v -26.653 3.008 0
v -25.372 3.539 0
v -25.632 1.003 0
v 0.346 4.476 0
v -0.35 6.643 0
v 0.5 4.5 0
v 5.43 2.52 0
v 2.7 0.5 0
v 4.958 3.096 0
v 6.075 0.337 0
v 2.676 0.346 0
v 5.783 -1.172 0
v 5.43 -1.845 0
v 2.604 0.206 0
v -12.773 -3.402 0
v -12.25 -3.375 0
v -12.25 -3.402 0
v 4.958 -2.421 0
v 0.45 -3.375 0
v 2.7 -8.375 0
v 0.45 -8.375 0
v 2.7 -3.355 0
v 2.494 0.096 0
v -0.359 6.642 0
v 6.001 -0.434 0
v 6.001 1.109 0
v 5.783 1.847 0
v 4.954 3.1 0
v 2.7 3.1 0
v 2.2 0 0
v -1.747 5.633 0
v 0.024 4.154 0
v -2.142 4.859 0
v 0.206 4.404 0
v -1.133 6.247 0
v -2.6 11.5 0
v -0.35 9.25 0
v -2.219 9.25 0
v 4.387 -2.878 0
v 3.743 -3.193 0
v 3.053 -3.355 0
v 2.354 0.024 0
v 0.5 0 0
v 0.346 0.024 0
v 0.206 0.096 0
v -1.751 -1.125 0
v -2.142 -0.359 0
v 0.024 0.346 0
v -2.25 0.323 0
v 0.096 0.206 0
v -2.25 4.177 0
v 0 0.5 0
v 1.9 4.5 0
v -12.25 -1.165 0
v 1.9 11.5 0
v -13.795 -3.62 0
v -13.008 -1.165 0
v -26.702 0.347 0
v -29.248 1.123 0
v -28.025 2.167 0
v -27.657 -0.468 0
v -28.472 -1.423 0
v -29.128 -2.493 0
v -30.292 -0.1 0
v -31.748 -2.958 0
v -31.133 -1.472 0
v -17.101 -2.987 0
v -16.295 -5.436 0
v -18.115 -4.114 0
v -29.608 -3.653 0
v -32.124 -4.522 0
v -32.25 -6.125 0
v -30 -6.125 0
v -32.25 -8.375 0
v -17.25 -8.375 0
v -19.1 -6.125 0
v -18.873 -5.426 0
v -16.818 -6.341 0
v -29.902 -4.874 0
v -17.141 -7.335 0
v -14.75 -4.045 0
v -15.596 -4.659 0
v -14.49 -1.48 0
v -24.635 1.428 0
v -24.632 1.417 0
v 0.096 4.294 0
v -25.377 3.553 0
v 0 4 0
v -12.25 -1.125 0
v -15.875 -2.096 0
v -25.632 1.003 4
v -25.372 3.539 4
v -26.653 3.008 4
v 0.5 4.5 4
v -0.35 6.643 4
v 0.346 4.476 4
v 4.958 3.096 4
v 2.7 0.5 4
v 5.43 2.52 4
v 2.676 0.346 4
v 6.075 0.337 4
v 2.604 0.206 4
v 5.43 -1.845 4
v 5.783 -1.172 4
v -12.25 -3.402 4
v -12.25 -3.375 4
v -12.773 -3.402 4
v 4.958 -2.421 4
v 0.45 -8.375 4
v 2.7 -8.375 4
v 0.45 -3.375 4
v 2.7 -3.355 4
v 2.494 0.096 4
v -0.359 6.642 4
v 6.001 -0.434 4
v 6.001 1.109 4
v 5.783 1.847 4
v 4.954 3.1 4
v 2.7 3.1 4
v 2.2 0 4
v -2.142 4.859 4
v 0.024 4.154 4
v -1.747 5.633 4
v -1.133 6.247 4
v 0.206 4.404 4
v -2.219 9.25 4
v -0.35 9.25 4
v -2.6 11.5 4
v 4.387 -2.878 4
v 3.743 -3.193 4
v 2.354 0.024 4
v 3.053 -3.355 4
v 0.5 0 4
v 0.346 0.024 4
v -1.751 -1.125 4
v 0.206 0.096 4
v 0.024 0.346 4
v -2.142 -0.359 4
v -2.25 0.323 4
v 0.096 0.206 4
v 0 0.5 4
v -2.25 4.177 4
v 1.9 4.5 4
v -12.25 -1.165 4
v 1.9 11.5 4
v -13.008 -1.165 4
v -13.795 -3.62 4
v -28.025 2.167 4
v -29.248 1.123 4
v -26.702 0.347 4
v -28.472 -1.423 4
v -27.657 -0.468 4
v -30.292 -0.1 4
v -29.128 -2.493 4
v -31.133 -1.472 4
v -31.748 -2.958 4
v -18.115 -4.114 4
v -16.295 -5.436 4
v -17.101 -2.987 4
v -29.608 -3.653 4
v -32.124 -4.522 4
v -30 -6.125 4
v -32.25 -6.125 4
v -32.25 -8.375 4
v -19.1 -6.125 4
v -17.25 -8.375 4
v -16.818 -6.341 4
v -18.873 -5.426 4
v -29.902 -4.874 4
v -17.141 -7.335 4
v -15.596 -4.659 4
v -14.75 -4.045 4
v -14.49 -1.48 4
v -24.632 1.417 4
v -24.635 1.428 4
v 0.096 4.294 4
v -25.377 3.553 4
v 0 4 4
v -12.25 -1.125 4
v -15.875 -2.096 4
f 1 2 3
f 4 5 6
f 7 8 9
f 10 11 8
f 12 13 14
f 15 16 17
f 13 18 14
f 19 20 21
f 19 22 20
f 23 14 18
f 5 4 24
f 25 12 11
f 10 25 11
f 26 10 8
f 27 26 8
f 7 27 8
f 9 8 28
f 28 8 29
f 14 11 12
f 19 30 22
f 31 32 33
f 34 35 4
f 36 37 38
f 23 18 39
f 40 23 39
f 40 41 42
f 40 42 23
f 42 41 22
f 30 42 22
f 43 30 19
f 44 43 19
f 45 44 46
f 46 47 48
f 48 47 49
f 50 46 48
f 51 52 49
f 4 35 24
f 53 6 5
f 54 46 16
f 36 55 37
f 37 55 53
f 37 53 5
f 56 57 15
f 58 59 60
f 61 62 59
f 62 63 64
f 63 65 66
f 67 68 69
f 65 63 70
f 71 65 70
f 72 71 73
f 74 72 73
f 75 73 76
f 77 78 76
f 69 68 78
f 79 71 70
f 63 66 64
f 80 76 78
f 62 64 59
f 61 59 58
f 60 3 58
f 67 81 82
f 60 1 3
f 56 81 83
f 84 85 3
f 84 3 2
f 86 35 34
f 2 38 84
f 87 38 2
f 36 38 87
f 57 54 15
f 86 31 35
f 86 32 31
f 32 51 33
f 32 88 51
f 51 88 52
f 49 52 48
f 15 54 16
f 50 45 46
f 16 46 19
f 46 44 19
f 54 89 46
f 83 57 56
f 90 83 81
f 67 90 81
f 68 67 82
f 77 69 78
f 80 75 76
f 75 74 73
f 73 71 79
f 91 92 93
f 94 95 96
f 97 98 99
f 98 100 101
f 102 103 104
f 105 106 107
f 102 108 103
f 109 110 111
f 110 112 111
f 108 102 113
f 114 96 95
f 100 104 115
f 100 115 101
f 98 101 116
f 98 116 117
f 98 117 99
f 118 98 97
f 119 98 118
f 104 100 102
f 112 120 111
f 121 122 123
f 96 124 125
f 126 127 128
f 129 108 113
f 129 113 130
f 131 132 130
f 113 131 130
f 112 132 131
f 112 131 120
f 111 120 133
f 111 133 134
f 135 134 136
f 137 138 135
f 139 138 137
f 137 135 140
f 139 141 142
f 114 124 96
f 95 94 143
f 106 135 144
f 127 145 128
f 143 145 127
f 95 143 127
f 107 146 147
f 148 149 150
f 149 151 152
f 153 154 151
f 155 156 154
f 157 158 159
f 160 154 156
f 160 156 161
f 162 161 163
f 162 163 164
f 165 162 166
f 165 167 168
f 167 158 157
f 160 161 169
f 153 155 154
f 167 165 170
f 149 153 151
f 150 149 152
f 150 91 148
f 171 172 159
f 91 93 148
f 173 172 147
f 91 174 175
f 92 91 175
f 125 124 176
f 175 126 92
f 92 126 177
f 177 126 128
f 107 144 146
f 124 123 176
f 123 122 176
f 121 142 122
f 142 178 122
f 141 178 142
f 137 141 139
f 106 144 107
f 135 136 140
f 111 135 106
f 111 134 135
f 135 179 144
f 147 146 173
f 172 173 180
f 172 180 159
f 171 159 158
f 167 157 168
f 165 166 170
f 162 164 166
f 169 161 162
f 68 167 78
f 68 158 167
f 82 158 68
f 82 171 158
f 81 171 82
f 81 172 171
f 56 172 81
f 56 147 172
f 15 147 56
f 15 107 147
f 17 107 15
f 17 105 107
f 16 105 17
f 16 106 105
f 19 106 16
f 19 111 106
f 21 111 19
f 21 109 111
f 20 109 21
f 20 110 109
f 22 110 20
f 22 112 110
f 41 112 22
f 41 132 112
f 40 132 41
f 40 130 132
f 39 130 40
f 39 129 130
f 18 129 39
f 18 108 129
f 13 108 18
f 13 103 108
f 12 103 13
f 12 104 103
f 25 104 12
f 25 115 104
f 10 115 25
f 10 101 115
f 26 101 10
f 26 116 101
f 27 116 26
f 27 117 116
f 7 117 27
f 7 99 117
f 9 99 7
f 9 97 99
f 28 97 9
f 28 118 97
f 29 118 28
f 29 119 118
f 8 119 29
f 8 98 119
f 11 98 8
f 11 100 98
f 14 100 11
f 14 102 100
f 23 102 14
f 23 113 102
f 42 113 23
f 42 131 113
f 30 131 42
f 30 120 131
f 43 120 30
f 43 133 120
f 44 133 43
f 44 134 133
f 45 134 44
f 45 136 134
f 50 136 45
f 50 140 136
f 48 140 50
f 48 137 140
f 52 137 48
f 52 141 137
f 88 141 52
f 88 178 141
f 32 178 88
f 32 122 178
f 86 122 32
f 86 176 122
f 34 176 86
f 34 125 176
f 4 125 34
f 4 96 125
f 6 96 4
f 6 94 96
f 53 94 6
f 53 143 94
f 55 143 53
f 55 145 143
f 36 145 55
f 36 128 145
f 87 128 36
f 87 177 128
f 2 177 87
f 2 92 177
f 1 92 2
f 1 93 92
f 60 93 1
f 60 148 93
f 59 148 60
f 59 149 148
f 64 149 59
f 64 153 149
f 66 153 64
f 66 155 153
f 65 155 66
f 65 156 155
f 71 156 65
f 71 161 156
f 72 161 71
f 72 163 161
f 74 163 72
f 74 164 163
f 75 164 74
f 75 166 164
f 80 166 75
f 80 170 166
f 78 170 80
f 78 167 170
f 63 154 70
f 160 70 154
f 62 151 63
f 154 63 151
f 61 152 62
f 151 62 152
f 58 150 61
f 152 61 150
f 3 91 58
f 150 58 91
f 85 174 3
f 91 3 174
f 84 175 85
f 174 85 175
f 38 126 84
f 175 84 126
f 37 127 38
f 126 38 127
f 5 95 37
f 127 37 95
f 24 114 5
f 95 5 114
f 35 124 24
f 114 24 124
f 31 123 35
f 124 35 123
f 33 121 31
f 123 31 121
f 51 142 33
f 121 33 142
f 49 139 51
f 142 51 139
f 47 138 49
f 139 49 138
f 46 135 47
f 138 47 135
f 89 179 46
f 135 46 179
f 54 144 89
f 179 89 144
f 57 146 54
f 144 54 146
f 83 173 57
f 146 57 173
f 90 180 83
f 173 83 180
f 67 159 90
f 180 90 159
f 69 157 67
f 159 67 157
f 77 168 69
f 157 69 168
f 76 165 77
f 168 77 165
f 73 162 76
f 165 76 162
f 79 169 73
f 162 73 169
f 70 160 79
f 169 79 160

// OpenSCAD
// pot_holder.scad
// By Gregg Christopher, 2015. 
// This file is public domain. Use at your own risk.


/* [Canister Bottom Edge Dimensions] */
// Height of the rolled metal portion (Rolled metal bottom of canister) Defaults are for a typical large 230g-ish canister.
edge_height = 4.5; // [0.5:0.1:15.0]
// Width (thickness) of the rolled metal portion
edge_width = 2.7; // [0.5:0.1:10.0]
// Radius to bevel the inside of the clip portion of the canister foot. Probably just cosmetic. 
edge_bevel_radius = 0.5; // [0.01:0.05:2.0]
// Thickness of the thinner metal portion above the rolled edge. Decrease to enlarge the portion of the foot pressing against the canister, if the foot tends to tilt up.
metal_thickness = .8; // [0.1:0.05:3.0]

/* [Holder Foot Dimensions] */
// Option to include a small support directly below the canister; might make it harder to break when set on a flat surface with a heavy load.
include_support_peg = "Include_Support_Peg"; // [No_Support_Peg, Include_Support_Peg]
// Width of the entire support. (Viewed from above as it sticks out from the canister.)
foot_width = 4; // [1.0:0.1:10.0]
// Thickness of the support structure.
foot_thickness = 2.25; // [0.5:0.1:10.0]
// Length of the bottom of the support leg, before it curves down to the ground.
foot_inner_length = 10; // [3.0:0.1:40.0]
// Height of the support leg, nominally how high it will hold the canister up. (Since these are plastic, a large value here is probably unwise.)
foot_lower_height = 5; // [0.1:0.1:20.0]
// Length of the portion of the leg that makes contact with the ground.
foot_base_length = 15; // [3.0:0.1:40.0]
// Height of the vertical section that makes contact with the side of the canister. 
cannister_contact_segment_height = 7; // [2.0:0.1:20.0]
// Height of the flange that grabs the inside bottom of the canister.
inner_flange_height = 3.1; // [0.5:0.1:10.0]
// Radius of the rounded portion on the outside of the upper leg of the support.
outer_leg_bevel_radius = 8; // [1.0:0.1:20.0]

/* [Hidden] */
// Calculate the angle at which the tangent line of the outer foot circle hits the rectangular top upper portion of he leg.

// Distance between the origin of the circle and the top corner of the leg

target_x_distance = (edge_width - 2*foot_thickness - metal_thickness) - (-foot_base_length - foot_inner_length - foot_lower_height + outer_leg_bevel_radius);
target_y_distance = (edge_height + cannister_contact_segment_height) - (-foot_lower_height - foot_thickness*0.5);
distance = sqrt(target_x_distance*target_x_distance + target_y_distance*target_y_distance);

// Radius of the outer foot circle portion
radius = outer_leg_bevel_radius + foot_thickness;

// Angle between the center point and the target point
otherangle = atan(target_y_distance/target_x_distance);

// Angle at which the line tangent to the circle intersects the target point
tangent_angle = acos(radius/distance) + otherangle - 90;

// Calculate the length of the upper leg segment, given all the above measurements.
tangent_point_x = -radius * sin(tangent_angle); 
tangent_point_y = radius * cos(tangent_angle); 

top_segment_x_distance = target_x_distance - tangent_point_x;
top_segment_y_distance = target_y_distance - tangent_point_y;

top_segment_length = sqrt(top_segment_x_distance * top_segment_x_distance + top_segment_y_distance * top_segment_y_distance);

module edge_outline() {
  translate([edge_bevel_radius, edge_bevel_radius])
  minkowski() {
    square([edge_width - 2*edge_bevel_radius, edge_height - 2*edge_bevel_radius]);
    circle(r = edge_bevel_radius, $fn = 20);
  }
}

linear_extrude(height = foot_width) {
  union() {
    // The main outline of the cannister clip
    difference() {
      union() {
        offset(delta = foot_thickness) edge_outline();
        // Extra material to reinforce the pot holder clip. (The weakest part of the structure.)
        translate([edge_width, foot_thickness*1.5*.1])
        scale([1, 1.1])
        intersection() {
          circle(r = foot_thickness*1.5, $fn = 30);
          //translate([0, -foot_thickness*1.5]) square([foot_thickness*1.5, foot_thickness*1.5]);
          translate([0, -foot_thickness*1.5]) 
          square([foot_thickness*1.5, foot_thickness*3.0]);
        }
      }

      edge_outline();
      //translate([edge_width - metal_thickness, edge_height - edge_bevel_radius])
      //square([metal_thickness, foot_thickness + edge_bevel_radius]);
      //translate([edge_width - metal_thickness, foot_thickness*1.0])
      translate([edge_width - metal_thickness, inner_flange_height])
      square([metal_thickness + foot_thickness*2, foot_thickness + edge_bevel_radius + edge_height - edge_bevel_radius - foot_thickness*1.0 + inner_flange_height]);
    }
    
    
    /* 
    // Full length thicker flange
    //translate([edge_width, 0])
    // square([foot_thickness*1.5, edge_height/2 - foot_thickness/2]); 

    translate([edge_width, edge_height - foot_thickness/2])
    %intersection() {
      circle(r = foot_thickness*1.5, $fn = 30);
      square([foot_thickness*1.5, foot_thickness*1.5]);
    }
    */
    
    // Inner segment holding the side of the cannister
    translate([edge_width - foot_thickness - metal_thickness, edge_height])
    square([foot_thickness, cannister_contact_segment_height]);

    translate([edge_width - 2*foot_thickness - metal_thickness, edge_height + cannister_contact_segment_height - foot_thickness])
    square([foot_thickness*2, foot_thickness]);
    
    // Optional support peg directly below the canister
    if(include_support_peg == "Include_Support_Peg") {
      translate([edge_width - foot_thickness, -foot_lower_height - foot_thickness*1.5])
      square([foot_thickness, foot_lower_height]);
    }

    // Main segment of bottom leg extension
    translate([-foot_inner_length - foot_thickness, -foot_thickness*1.5])
    square([foot_inner_length + foot_thickness + edge_width, foot_thickness]);
    
    // The curved portion of the lower leg extension
    translate([-foot_inner_length - foot_thickness, -foot_lower_height - foot_thickness*1.5])
    intersection() {
      difference() {
        circle(r = foot_lower_height + foot_thickness, $fn = 30);
        circle(r = foot_lower_height, $fn = 30);
      }
      translate([-foot_lower_height - foot_thickness, 0])
      square([foot_lower_height + foot_thickness, foot_lower_height + foot_thickness]);
    }
    
    // The bottom segment that rests on the ground
    translate([-foot_base_length - foot_inner_length - foot_thickness - foot_lower_height, -foot_lower_height - foot_thickness*1.5])
    square([foot_base_length, foot_thickness]);
    
    // The annoyingly shaped top leg extension
    
    translate([-foot_base_length - foot_inner_length - foot_lower_height + outer_leg_bevel_radius, -foot_lower_height - foot_thickness*0.5])
    intersection() {
      difference() {
        circle(r = outer_leg_bevel_radius + foot_thickness, $fn = 40);
        circle(r = outer_leg_bevel_radius, $fn = 40);
      }
      rotate([0, 0, 90]) square([outer_leg_bevel_radius + foot_thickness, outer_leg_bevel_radius + foot_thickness]);
      rotate([0, 0, 90 + tangent_angle]) square([outer_leg_bevel_radius + foot_thickness, outer_leg_bevel_radius + foot_thickness]);
    }
    
    translate([-foot_base_length - foot_inner_length - foot_lower_height + outer_leg_bevel_radius, -foot_lower_height - foot_thickness*0.5])
    rotate([0, 0, tangent_angle])
    translate([0, outer_leg_bevel_radius])
    square([top_segment_length, foot_thickness]);

    //translate([edge_width - 2*foot_thickness - metal_thickness, edge_height + cannister_contact_segment_height - foot_thickness])
    //circle(r = 0.5);
    
  }
}
  
  


